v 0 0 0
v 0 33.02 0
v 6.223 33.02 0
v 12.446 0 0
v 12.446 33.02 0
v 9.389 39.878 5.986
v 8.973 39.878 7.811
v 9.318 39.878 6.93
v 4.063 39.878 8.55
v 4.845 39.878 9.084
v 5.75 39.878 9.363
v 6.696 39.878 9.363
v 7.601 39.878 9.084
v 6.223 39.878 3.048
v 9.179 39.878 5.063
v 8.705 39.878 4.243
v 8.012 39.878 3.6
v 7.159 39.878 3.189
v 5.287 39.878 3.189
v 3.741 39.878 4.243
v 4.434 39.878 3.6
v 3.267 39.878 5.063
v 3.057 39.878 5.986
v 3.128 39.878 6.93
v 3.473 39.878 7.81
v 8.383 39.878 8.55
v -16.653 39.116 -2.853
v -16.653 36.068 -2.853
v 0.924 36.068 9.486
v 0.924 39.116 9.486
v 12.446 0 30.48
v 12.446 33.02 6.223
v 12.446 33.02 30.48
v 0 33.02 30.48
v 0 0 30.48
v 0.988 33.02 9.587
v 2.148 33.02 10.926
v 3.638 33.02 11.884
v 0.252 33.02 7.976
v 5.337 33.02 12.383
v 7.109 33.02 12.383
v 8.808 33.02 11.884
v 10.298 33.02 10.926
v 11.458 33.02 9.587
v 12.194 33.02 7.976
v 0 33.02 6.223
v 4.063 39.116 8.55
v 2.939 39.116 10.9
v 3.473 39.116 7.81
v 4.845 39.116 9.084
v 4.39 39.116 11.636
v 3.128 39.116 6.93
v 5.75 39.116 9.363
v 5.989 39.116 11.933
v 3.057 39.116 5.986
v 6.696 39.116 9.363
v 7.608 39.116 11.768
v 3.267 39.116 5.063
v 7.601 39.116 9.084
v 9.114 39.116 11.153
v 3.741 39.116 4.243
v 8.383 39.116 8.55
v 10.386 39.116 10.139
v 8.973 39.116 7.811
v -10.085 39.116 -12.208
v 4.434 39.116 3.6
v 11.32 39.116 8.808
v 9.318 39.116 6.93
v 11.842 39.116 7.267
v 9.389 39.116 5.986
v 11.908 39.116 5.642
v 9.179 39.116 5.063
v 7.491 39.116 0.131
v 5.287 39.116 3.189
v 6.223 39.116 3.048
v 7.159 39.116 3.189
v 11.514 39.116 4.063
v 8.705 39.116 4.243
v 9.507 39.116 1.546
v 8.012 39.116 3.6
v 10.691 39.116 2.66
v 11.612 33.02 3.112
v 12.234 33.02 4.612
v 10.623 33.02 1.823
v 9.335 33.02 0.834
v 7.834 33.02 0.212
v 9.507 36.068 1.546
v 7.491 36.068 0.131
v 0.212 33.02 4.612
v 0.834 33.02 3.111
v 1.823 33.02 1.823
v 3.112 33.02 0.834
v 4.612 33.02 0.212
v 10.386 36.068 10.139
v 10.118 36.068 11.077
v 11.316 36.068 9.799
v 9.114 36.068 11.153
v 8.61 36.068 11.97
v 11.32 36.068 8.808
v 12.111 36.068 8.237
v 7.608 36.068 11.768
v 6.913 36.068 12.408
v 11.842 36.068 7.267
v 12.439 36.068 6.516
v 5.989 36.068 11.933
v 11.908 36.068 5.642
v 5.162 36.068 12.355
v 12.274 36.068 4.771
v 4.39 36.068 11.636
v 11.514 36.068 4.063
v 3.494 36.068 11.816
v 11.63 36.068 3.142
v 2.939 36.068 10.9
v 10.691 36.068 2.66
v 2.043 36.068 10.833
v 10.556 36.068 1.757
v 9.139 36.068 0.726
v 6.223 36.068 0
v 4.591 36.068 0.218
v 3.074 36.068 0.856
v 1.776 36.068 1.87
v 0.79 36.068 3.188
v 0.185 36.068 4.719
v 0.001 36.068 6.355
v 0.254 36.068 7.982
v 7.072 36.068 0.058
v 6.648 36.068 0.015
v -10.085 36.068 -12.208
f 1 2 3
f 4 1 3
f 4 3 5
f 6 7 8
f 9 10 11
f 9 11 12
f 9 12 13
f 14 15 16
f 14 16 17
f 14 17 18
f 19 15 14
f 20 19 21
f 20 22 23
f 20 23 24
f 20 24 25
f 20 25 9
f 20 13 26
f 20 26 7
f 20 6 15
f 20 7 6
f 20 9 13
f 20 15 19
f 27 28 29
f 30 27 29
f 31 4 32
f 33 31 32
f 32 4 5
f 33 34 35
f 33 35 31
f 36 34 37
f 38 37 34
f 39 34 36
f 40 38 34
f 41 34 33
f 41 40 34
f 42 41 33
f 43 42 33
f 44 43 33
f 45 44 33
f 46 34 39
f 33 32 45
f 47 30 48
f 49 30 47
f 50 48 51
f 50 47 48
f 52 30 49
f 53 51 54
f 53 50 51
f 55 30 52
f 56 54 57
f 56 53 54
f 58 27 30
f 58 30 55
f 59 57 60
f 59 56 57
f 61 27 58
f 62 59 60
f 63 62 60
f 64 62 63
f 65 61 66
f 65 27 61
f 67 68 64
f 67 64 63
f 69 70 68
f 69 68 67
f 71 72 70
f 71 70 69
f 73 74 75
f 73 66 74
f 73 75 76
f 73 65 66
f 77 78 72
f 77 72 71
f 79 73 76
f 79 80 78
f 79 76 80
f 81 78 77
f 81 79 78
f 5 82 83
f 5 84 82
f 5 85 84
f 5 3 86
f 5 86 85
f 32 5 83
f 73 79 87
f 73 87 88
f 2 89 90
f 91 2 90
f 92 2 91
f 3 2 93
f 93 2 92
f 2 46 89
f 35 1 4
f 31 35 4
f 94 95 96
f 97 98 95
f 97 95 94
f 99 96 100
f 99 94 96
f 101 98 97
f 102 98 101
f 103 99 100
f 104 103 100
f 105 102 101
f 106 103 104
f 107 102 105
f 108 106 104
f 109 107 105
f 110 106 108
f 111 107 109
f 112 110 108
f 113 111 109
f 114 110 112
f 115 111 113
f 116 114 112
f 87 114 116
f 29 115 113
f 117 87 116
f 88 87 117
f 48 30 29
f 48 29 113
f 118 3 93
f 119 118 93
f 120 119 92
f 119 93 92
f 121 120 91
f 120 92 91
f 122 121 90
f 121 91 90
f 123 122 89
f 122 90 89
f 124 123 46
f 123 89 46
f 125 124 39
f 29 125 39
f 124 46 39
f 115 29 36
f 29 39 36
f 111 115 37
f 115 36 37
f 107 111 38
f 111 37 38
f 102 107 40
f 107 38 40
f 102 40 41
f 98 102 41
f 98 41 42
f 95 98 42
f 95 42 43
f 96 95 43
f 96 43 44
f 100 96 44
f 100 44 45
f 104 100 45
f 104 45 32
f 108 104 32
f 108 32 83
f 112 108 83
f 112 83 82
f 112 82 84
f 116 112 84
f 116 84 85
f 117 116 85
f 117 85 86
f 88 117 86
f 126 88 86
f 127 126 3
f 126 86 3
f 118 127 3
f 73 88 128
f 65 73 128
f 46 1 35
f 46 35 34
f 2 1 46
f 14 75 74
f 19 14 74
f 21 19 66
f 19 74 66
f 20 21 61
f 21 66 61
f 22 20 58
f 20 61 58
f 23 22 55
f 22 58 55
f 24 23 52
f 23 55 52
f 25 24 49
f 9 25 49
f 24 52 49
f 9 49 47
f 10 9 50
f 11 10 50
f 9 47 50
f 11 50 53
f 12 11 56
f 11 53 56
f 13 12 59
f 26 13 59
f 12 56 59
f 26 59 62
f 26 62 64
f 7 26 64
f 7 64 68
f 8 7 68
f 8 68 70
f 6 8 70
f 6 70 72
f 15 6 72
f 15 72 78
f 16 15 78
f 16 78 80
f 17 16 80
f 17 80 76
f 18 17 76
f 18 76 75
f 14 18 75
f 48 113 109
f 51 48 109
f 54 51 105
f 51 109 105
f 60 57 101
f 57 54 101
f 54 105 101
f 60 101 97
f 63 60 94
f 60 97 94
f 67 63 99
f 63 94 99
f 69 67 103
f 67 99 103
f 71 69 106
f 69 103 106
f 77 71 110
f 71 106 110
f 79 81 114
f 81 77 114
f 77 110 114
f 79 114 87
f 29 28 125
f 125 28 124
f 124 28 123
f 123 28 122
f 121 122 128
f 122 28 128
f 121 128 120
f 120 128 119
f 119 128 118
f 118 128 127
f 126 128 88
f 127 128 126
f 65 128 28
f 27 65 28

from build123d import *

# Parameters (mm, degrees)
SKETCH1_W           = 12.446
SKETCH1_H           = 33.02
BOSS_EXTRUDE1_DEPTH = 30.48
SKETCH3_R           = 6.223
BOSS_EXTRUDE2_DEPTH = 3.048
SKETCH4_R           = 3.175
BOSS_EXTRUDE3_DEPTH = 3.81
SKETCH5_R           = 5.715
SKETCH5_R_2         = 3.175
BOSS_EXTRUDE5_DEPTH = 3.048


with BuildPart() as part:
    # Sketch1 → Boss-Extrude1 (new body)
    with BuildSketch(Plane.XY):
        with Locations((6.223, 16.51)):
            Rectangle(SKETCH1_W, SKETCH1_H)
    extrude(amount=BOSS_EXTRUDE1_DEPTH)

    # Sketch3 → Boss-Extrude2 (add)
    with BuildSketch(Plane(origin=(0, 33.02, 0), x_dir=(1, 0, 0), z_dir=(0, 1, 0))):
        with Locations(Location((6.223, -6.223, 0), (0, 0, 90))):
            Circle(SKETCH3_R)
    extrude(amount=BOSS_EXTRUDE2_DEPTH)

    # Sketch4 → Boss-Extrude3 (add)
    with BuildSketch(Plane(origin=(0, 36.068, 0), x_dir=(1, 0, 0), z_dir=(0, 1, 0))):
        with Locations(Location((6.223, -6.223, 0), (0, 0, 90))):
            Circle(SKETCH4_R)
    extrude(amount=BOSS_EXTRUDE3_DEPTH)

    # Sketch5 → Boss-Extrude5 (add)
    # profile 1 of 3: a face of its own
    with BuildSketch(Plane(origin=(0, 36.068, 0), x_dir=(1, 0, 0), z_dir=(0, 1, 0))):
        with Locations((6.223, -6.223)):
            Circle(SKETCH5_R)
        with Locations(Location((6.223, -6.223, 0), (0, 0, 90))):
            Circle(SKETCH5_R_2, mode=Mode.SUBTRACT)
    # profile 2 of 3: a face of its own
    with BuildSketch(Plane(origin=(0, 36.068, 0), x_dir=(1, 0, 0), z_dir=(0, 1, 0))):
        with BuildLine():
            ThreePointArc((0.923781736, -9.485516634), (1.129757079, -2.647443323), (7.491130735, -0.130580658))
            Line((7.491130735, -0.130580658), (-10.085283199, 12.208407524))
            Line((-10.085283199, 12.208407524), (-16.652632198, 2.853471548))
            Line((-16.652632198, 2.853471548), (0.923781736, -9.485516634))
        make_face()
    # profile 3 of 3: a face of its own
    with BuildSketch(Plane(origin=(0, 36.068, 0), x_dir=(1, 0, 0), z_dir=(0, 1, 0))):
        with BuildLine():
            ThreePointArc((2.9393255, -10.900467988), (1.545532012, -2.9393255), (9.5066745, -1.545532012))
            Line((9.5066745, -1.545532012), (7.491130735, -0.130580658))
            ThreePointArc((7.491130735, -0.130580658), (1.129757079, -2.647443323), (0.923781736, -9.485516634))
            Line((0.923781736, -9.485516634), (2.9393255, -10.900467988))
        make_face()
    extrude(amount=BOSS_EXTRUDE5_DEPTH)


solid = part.part
